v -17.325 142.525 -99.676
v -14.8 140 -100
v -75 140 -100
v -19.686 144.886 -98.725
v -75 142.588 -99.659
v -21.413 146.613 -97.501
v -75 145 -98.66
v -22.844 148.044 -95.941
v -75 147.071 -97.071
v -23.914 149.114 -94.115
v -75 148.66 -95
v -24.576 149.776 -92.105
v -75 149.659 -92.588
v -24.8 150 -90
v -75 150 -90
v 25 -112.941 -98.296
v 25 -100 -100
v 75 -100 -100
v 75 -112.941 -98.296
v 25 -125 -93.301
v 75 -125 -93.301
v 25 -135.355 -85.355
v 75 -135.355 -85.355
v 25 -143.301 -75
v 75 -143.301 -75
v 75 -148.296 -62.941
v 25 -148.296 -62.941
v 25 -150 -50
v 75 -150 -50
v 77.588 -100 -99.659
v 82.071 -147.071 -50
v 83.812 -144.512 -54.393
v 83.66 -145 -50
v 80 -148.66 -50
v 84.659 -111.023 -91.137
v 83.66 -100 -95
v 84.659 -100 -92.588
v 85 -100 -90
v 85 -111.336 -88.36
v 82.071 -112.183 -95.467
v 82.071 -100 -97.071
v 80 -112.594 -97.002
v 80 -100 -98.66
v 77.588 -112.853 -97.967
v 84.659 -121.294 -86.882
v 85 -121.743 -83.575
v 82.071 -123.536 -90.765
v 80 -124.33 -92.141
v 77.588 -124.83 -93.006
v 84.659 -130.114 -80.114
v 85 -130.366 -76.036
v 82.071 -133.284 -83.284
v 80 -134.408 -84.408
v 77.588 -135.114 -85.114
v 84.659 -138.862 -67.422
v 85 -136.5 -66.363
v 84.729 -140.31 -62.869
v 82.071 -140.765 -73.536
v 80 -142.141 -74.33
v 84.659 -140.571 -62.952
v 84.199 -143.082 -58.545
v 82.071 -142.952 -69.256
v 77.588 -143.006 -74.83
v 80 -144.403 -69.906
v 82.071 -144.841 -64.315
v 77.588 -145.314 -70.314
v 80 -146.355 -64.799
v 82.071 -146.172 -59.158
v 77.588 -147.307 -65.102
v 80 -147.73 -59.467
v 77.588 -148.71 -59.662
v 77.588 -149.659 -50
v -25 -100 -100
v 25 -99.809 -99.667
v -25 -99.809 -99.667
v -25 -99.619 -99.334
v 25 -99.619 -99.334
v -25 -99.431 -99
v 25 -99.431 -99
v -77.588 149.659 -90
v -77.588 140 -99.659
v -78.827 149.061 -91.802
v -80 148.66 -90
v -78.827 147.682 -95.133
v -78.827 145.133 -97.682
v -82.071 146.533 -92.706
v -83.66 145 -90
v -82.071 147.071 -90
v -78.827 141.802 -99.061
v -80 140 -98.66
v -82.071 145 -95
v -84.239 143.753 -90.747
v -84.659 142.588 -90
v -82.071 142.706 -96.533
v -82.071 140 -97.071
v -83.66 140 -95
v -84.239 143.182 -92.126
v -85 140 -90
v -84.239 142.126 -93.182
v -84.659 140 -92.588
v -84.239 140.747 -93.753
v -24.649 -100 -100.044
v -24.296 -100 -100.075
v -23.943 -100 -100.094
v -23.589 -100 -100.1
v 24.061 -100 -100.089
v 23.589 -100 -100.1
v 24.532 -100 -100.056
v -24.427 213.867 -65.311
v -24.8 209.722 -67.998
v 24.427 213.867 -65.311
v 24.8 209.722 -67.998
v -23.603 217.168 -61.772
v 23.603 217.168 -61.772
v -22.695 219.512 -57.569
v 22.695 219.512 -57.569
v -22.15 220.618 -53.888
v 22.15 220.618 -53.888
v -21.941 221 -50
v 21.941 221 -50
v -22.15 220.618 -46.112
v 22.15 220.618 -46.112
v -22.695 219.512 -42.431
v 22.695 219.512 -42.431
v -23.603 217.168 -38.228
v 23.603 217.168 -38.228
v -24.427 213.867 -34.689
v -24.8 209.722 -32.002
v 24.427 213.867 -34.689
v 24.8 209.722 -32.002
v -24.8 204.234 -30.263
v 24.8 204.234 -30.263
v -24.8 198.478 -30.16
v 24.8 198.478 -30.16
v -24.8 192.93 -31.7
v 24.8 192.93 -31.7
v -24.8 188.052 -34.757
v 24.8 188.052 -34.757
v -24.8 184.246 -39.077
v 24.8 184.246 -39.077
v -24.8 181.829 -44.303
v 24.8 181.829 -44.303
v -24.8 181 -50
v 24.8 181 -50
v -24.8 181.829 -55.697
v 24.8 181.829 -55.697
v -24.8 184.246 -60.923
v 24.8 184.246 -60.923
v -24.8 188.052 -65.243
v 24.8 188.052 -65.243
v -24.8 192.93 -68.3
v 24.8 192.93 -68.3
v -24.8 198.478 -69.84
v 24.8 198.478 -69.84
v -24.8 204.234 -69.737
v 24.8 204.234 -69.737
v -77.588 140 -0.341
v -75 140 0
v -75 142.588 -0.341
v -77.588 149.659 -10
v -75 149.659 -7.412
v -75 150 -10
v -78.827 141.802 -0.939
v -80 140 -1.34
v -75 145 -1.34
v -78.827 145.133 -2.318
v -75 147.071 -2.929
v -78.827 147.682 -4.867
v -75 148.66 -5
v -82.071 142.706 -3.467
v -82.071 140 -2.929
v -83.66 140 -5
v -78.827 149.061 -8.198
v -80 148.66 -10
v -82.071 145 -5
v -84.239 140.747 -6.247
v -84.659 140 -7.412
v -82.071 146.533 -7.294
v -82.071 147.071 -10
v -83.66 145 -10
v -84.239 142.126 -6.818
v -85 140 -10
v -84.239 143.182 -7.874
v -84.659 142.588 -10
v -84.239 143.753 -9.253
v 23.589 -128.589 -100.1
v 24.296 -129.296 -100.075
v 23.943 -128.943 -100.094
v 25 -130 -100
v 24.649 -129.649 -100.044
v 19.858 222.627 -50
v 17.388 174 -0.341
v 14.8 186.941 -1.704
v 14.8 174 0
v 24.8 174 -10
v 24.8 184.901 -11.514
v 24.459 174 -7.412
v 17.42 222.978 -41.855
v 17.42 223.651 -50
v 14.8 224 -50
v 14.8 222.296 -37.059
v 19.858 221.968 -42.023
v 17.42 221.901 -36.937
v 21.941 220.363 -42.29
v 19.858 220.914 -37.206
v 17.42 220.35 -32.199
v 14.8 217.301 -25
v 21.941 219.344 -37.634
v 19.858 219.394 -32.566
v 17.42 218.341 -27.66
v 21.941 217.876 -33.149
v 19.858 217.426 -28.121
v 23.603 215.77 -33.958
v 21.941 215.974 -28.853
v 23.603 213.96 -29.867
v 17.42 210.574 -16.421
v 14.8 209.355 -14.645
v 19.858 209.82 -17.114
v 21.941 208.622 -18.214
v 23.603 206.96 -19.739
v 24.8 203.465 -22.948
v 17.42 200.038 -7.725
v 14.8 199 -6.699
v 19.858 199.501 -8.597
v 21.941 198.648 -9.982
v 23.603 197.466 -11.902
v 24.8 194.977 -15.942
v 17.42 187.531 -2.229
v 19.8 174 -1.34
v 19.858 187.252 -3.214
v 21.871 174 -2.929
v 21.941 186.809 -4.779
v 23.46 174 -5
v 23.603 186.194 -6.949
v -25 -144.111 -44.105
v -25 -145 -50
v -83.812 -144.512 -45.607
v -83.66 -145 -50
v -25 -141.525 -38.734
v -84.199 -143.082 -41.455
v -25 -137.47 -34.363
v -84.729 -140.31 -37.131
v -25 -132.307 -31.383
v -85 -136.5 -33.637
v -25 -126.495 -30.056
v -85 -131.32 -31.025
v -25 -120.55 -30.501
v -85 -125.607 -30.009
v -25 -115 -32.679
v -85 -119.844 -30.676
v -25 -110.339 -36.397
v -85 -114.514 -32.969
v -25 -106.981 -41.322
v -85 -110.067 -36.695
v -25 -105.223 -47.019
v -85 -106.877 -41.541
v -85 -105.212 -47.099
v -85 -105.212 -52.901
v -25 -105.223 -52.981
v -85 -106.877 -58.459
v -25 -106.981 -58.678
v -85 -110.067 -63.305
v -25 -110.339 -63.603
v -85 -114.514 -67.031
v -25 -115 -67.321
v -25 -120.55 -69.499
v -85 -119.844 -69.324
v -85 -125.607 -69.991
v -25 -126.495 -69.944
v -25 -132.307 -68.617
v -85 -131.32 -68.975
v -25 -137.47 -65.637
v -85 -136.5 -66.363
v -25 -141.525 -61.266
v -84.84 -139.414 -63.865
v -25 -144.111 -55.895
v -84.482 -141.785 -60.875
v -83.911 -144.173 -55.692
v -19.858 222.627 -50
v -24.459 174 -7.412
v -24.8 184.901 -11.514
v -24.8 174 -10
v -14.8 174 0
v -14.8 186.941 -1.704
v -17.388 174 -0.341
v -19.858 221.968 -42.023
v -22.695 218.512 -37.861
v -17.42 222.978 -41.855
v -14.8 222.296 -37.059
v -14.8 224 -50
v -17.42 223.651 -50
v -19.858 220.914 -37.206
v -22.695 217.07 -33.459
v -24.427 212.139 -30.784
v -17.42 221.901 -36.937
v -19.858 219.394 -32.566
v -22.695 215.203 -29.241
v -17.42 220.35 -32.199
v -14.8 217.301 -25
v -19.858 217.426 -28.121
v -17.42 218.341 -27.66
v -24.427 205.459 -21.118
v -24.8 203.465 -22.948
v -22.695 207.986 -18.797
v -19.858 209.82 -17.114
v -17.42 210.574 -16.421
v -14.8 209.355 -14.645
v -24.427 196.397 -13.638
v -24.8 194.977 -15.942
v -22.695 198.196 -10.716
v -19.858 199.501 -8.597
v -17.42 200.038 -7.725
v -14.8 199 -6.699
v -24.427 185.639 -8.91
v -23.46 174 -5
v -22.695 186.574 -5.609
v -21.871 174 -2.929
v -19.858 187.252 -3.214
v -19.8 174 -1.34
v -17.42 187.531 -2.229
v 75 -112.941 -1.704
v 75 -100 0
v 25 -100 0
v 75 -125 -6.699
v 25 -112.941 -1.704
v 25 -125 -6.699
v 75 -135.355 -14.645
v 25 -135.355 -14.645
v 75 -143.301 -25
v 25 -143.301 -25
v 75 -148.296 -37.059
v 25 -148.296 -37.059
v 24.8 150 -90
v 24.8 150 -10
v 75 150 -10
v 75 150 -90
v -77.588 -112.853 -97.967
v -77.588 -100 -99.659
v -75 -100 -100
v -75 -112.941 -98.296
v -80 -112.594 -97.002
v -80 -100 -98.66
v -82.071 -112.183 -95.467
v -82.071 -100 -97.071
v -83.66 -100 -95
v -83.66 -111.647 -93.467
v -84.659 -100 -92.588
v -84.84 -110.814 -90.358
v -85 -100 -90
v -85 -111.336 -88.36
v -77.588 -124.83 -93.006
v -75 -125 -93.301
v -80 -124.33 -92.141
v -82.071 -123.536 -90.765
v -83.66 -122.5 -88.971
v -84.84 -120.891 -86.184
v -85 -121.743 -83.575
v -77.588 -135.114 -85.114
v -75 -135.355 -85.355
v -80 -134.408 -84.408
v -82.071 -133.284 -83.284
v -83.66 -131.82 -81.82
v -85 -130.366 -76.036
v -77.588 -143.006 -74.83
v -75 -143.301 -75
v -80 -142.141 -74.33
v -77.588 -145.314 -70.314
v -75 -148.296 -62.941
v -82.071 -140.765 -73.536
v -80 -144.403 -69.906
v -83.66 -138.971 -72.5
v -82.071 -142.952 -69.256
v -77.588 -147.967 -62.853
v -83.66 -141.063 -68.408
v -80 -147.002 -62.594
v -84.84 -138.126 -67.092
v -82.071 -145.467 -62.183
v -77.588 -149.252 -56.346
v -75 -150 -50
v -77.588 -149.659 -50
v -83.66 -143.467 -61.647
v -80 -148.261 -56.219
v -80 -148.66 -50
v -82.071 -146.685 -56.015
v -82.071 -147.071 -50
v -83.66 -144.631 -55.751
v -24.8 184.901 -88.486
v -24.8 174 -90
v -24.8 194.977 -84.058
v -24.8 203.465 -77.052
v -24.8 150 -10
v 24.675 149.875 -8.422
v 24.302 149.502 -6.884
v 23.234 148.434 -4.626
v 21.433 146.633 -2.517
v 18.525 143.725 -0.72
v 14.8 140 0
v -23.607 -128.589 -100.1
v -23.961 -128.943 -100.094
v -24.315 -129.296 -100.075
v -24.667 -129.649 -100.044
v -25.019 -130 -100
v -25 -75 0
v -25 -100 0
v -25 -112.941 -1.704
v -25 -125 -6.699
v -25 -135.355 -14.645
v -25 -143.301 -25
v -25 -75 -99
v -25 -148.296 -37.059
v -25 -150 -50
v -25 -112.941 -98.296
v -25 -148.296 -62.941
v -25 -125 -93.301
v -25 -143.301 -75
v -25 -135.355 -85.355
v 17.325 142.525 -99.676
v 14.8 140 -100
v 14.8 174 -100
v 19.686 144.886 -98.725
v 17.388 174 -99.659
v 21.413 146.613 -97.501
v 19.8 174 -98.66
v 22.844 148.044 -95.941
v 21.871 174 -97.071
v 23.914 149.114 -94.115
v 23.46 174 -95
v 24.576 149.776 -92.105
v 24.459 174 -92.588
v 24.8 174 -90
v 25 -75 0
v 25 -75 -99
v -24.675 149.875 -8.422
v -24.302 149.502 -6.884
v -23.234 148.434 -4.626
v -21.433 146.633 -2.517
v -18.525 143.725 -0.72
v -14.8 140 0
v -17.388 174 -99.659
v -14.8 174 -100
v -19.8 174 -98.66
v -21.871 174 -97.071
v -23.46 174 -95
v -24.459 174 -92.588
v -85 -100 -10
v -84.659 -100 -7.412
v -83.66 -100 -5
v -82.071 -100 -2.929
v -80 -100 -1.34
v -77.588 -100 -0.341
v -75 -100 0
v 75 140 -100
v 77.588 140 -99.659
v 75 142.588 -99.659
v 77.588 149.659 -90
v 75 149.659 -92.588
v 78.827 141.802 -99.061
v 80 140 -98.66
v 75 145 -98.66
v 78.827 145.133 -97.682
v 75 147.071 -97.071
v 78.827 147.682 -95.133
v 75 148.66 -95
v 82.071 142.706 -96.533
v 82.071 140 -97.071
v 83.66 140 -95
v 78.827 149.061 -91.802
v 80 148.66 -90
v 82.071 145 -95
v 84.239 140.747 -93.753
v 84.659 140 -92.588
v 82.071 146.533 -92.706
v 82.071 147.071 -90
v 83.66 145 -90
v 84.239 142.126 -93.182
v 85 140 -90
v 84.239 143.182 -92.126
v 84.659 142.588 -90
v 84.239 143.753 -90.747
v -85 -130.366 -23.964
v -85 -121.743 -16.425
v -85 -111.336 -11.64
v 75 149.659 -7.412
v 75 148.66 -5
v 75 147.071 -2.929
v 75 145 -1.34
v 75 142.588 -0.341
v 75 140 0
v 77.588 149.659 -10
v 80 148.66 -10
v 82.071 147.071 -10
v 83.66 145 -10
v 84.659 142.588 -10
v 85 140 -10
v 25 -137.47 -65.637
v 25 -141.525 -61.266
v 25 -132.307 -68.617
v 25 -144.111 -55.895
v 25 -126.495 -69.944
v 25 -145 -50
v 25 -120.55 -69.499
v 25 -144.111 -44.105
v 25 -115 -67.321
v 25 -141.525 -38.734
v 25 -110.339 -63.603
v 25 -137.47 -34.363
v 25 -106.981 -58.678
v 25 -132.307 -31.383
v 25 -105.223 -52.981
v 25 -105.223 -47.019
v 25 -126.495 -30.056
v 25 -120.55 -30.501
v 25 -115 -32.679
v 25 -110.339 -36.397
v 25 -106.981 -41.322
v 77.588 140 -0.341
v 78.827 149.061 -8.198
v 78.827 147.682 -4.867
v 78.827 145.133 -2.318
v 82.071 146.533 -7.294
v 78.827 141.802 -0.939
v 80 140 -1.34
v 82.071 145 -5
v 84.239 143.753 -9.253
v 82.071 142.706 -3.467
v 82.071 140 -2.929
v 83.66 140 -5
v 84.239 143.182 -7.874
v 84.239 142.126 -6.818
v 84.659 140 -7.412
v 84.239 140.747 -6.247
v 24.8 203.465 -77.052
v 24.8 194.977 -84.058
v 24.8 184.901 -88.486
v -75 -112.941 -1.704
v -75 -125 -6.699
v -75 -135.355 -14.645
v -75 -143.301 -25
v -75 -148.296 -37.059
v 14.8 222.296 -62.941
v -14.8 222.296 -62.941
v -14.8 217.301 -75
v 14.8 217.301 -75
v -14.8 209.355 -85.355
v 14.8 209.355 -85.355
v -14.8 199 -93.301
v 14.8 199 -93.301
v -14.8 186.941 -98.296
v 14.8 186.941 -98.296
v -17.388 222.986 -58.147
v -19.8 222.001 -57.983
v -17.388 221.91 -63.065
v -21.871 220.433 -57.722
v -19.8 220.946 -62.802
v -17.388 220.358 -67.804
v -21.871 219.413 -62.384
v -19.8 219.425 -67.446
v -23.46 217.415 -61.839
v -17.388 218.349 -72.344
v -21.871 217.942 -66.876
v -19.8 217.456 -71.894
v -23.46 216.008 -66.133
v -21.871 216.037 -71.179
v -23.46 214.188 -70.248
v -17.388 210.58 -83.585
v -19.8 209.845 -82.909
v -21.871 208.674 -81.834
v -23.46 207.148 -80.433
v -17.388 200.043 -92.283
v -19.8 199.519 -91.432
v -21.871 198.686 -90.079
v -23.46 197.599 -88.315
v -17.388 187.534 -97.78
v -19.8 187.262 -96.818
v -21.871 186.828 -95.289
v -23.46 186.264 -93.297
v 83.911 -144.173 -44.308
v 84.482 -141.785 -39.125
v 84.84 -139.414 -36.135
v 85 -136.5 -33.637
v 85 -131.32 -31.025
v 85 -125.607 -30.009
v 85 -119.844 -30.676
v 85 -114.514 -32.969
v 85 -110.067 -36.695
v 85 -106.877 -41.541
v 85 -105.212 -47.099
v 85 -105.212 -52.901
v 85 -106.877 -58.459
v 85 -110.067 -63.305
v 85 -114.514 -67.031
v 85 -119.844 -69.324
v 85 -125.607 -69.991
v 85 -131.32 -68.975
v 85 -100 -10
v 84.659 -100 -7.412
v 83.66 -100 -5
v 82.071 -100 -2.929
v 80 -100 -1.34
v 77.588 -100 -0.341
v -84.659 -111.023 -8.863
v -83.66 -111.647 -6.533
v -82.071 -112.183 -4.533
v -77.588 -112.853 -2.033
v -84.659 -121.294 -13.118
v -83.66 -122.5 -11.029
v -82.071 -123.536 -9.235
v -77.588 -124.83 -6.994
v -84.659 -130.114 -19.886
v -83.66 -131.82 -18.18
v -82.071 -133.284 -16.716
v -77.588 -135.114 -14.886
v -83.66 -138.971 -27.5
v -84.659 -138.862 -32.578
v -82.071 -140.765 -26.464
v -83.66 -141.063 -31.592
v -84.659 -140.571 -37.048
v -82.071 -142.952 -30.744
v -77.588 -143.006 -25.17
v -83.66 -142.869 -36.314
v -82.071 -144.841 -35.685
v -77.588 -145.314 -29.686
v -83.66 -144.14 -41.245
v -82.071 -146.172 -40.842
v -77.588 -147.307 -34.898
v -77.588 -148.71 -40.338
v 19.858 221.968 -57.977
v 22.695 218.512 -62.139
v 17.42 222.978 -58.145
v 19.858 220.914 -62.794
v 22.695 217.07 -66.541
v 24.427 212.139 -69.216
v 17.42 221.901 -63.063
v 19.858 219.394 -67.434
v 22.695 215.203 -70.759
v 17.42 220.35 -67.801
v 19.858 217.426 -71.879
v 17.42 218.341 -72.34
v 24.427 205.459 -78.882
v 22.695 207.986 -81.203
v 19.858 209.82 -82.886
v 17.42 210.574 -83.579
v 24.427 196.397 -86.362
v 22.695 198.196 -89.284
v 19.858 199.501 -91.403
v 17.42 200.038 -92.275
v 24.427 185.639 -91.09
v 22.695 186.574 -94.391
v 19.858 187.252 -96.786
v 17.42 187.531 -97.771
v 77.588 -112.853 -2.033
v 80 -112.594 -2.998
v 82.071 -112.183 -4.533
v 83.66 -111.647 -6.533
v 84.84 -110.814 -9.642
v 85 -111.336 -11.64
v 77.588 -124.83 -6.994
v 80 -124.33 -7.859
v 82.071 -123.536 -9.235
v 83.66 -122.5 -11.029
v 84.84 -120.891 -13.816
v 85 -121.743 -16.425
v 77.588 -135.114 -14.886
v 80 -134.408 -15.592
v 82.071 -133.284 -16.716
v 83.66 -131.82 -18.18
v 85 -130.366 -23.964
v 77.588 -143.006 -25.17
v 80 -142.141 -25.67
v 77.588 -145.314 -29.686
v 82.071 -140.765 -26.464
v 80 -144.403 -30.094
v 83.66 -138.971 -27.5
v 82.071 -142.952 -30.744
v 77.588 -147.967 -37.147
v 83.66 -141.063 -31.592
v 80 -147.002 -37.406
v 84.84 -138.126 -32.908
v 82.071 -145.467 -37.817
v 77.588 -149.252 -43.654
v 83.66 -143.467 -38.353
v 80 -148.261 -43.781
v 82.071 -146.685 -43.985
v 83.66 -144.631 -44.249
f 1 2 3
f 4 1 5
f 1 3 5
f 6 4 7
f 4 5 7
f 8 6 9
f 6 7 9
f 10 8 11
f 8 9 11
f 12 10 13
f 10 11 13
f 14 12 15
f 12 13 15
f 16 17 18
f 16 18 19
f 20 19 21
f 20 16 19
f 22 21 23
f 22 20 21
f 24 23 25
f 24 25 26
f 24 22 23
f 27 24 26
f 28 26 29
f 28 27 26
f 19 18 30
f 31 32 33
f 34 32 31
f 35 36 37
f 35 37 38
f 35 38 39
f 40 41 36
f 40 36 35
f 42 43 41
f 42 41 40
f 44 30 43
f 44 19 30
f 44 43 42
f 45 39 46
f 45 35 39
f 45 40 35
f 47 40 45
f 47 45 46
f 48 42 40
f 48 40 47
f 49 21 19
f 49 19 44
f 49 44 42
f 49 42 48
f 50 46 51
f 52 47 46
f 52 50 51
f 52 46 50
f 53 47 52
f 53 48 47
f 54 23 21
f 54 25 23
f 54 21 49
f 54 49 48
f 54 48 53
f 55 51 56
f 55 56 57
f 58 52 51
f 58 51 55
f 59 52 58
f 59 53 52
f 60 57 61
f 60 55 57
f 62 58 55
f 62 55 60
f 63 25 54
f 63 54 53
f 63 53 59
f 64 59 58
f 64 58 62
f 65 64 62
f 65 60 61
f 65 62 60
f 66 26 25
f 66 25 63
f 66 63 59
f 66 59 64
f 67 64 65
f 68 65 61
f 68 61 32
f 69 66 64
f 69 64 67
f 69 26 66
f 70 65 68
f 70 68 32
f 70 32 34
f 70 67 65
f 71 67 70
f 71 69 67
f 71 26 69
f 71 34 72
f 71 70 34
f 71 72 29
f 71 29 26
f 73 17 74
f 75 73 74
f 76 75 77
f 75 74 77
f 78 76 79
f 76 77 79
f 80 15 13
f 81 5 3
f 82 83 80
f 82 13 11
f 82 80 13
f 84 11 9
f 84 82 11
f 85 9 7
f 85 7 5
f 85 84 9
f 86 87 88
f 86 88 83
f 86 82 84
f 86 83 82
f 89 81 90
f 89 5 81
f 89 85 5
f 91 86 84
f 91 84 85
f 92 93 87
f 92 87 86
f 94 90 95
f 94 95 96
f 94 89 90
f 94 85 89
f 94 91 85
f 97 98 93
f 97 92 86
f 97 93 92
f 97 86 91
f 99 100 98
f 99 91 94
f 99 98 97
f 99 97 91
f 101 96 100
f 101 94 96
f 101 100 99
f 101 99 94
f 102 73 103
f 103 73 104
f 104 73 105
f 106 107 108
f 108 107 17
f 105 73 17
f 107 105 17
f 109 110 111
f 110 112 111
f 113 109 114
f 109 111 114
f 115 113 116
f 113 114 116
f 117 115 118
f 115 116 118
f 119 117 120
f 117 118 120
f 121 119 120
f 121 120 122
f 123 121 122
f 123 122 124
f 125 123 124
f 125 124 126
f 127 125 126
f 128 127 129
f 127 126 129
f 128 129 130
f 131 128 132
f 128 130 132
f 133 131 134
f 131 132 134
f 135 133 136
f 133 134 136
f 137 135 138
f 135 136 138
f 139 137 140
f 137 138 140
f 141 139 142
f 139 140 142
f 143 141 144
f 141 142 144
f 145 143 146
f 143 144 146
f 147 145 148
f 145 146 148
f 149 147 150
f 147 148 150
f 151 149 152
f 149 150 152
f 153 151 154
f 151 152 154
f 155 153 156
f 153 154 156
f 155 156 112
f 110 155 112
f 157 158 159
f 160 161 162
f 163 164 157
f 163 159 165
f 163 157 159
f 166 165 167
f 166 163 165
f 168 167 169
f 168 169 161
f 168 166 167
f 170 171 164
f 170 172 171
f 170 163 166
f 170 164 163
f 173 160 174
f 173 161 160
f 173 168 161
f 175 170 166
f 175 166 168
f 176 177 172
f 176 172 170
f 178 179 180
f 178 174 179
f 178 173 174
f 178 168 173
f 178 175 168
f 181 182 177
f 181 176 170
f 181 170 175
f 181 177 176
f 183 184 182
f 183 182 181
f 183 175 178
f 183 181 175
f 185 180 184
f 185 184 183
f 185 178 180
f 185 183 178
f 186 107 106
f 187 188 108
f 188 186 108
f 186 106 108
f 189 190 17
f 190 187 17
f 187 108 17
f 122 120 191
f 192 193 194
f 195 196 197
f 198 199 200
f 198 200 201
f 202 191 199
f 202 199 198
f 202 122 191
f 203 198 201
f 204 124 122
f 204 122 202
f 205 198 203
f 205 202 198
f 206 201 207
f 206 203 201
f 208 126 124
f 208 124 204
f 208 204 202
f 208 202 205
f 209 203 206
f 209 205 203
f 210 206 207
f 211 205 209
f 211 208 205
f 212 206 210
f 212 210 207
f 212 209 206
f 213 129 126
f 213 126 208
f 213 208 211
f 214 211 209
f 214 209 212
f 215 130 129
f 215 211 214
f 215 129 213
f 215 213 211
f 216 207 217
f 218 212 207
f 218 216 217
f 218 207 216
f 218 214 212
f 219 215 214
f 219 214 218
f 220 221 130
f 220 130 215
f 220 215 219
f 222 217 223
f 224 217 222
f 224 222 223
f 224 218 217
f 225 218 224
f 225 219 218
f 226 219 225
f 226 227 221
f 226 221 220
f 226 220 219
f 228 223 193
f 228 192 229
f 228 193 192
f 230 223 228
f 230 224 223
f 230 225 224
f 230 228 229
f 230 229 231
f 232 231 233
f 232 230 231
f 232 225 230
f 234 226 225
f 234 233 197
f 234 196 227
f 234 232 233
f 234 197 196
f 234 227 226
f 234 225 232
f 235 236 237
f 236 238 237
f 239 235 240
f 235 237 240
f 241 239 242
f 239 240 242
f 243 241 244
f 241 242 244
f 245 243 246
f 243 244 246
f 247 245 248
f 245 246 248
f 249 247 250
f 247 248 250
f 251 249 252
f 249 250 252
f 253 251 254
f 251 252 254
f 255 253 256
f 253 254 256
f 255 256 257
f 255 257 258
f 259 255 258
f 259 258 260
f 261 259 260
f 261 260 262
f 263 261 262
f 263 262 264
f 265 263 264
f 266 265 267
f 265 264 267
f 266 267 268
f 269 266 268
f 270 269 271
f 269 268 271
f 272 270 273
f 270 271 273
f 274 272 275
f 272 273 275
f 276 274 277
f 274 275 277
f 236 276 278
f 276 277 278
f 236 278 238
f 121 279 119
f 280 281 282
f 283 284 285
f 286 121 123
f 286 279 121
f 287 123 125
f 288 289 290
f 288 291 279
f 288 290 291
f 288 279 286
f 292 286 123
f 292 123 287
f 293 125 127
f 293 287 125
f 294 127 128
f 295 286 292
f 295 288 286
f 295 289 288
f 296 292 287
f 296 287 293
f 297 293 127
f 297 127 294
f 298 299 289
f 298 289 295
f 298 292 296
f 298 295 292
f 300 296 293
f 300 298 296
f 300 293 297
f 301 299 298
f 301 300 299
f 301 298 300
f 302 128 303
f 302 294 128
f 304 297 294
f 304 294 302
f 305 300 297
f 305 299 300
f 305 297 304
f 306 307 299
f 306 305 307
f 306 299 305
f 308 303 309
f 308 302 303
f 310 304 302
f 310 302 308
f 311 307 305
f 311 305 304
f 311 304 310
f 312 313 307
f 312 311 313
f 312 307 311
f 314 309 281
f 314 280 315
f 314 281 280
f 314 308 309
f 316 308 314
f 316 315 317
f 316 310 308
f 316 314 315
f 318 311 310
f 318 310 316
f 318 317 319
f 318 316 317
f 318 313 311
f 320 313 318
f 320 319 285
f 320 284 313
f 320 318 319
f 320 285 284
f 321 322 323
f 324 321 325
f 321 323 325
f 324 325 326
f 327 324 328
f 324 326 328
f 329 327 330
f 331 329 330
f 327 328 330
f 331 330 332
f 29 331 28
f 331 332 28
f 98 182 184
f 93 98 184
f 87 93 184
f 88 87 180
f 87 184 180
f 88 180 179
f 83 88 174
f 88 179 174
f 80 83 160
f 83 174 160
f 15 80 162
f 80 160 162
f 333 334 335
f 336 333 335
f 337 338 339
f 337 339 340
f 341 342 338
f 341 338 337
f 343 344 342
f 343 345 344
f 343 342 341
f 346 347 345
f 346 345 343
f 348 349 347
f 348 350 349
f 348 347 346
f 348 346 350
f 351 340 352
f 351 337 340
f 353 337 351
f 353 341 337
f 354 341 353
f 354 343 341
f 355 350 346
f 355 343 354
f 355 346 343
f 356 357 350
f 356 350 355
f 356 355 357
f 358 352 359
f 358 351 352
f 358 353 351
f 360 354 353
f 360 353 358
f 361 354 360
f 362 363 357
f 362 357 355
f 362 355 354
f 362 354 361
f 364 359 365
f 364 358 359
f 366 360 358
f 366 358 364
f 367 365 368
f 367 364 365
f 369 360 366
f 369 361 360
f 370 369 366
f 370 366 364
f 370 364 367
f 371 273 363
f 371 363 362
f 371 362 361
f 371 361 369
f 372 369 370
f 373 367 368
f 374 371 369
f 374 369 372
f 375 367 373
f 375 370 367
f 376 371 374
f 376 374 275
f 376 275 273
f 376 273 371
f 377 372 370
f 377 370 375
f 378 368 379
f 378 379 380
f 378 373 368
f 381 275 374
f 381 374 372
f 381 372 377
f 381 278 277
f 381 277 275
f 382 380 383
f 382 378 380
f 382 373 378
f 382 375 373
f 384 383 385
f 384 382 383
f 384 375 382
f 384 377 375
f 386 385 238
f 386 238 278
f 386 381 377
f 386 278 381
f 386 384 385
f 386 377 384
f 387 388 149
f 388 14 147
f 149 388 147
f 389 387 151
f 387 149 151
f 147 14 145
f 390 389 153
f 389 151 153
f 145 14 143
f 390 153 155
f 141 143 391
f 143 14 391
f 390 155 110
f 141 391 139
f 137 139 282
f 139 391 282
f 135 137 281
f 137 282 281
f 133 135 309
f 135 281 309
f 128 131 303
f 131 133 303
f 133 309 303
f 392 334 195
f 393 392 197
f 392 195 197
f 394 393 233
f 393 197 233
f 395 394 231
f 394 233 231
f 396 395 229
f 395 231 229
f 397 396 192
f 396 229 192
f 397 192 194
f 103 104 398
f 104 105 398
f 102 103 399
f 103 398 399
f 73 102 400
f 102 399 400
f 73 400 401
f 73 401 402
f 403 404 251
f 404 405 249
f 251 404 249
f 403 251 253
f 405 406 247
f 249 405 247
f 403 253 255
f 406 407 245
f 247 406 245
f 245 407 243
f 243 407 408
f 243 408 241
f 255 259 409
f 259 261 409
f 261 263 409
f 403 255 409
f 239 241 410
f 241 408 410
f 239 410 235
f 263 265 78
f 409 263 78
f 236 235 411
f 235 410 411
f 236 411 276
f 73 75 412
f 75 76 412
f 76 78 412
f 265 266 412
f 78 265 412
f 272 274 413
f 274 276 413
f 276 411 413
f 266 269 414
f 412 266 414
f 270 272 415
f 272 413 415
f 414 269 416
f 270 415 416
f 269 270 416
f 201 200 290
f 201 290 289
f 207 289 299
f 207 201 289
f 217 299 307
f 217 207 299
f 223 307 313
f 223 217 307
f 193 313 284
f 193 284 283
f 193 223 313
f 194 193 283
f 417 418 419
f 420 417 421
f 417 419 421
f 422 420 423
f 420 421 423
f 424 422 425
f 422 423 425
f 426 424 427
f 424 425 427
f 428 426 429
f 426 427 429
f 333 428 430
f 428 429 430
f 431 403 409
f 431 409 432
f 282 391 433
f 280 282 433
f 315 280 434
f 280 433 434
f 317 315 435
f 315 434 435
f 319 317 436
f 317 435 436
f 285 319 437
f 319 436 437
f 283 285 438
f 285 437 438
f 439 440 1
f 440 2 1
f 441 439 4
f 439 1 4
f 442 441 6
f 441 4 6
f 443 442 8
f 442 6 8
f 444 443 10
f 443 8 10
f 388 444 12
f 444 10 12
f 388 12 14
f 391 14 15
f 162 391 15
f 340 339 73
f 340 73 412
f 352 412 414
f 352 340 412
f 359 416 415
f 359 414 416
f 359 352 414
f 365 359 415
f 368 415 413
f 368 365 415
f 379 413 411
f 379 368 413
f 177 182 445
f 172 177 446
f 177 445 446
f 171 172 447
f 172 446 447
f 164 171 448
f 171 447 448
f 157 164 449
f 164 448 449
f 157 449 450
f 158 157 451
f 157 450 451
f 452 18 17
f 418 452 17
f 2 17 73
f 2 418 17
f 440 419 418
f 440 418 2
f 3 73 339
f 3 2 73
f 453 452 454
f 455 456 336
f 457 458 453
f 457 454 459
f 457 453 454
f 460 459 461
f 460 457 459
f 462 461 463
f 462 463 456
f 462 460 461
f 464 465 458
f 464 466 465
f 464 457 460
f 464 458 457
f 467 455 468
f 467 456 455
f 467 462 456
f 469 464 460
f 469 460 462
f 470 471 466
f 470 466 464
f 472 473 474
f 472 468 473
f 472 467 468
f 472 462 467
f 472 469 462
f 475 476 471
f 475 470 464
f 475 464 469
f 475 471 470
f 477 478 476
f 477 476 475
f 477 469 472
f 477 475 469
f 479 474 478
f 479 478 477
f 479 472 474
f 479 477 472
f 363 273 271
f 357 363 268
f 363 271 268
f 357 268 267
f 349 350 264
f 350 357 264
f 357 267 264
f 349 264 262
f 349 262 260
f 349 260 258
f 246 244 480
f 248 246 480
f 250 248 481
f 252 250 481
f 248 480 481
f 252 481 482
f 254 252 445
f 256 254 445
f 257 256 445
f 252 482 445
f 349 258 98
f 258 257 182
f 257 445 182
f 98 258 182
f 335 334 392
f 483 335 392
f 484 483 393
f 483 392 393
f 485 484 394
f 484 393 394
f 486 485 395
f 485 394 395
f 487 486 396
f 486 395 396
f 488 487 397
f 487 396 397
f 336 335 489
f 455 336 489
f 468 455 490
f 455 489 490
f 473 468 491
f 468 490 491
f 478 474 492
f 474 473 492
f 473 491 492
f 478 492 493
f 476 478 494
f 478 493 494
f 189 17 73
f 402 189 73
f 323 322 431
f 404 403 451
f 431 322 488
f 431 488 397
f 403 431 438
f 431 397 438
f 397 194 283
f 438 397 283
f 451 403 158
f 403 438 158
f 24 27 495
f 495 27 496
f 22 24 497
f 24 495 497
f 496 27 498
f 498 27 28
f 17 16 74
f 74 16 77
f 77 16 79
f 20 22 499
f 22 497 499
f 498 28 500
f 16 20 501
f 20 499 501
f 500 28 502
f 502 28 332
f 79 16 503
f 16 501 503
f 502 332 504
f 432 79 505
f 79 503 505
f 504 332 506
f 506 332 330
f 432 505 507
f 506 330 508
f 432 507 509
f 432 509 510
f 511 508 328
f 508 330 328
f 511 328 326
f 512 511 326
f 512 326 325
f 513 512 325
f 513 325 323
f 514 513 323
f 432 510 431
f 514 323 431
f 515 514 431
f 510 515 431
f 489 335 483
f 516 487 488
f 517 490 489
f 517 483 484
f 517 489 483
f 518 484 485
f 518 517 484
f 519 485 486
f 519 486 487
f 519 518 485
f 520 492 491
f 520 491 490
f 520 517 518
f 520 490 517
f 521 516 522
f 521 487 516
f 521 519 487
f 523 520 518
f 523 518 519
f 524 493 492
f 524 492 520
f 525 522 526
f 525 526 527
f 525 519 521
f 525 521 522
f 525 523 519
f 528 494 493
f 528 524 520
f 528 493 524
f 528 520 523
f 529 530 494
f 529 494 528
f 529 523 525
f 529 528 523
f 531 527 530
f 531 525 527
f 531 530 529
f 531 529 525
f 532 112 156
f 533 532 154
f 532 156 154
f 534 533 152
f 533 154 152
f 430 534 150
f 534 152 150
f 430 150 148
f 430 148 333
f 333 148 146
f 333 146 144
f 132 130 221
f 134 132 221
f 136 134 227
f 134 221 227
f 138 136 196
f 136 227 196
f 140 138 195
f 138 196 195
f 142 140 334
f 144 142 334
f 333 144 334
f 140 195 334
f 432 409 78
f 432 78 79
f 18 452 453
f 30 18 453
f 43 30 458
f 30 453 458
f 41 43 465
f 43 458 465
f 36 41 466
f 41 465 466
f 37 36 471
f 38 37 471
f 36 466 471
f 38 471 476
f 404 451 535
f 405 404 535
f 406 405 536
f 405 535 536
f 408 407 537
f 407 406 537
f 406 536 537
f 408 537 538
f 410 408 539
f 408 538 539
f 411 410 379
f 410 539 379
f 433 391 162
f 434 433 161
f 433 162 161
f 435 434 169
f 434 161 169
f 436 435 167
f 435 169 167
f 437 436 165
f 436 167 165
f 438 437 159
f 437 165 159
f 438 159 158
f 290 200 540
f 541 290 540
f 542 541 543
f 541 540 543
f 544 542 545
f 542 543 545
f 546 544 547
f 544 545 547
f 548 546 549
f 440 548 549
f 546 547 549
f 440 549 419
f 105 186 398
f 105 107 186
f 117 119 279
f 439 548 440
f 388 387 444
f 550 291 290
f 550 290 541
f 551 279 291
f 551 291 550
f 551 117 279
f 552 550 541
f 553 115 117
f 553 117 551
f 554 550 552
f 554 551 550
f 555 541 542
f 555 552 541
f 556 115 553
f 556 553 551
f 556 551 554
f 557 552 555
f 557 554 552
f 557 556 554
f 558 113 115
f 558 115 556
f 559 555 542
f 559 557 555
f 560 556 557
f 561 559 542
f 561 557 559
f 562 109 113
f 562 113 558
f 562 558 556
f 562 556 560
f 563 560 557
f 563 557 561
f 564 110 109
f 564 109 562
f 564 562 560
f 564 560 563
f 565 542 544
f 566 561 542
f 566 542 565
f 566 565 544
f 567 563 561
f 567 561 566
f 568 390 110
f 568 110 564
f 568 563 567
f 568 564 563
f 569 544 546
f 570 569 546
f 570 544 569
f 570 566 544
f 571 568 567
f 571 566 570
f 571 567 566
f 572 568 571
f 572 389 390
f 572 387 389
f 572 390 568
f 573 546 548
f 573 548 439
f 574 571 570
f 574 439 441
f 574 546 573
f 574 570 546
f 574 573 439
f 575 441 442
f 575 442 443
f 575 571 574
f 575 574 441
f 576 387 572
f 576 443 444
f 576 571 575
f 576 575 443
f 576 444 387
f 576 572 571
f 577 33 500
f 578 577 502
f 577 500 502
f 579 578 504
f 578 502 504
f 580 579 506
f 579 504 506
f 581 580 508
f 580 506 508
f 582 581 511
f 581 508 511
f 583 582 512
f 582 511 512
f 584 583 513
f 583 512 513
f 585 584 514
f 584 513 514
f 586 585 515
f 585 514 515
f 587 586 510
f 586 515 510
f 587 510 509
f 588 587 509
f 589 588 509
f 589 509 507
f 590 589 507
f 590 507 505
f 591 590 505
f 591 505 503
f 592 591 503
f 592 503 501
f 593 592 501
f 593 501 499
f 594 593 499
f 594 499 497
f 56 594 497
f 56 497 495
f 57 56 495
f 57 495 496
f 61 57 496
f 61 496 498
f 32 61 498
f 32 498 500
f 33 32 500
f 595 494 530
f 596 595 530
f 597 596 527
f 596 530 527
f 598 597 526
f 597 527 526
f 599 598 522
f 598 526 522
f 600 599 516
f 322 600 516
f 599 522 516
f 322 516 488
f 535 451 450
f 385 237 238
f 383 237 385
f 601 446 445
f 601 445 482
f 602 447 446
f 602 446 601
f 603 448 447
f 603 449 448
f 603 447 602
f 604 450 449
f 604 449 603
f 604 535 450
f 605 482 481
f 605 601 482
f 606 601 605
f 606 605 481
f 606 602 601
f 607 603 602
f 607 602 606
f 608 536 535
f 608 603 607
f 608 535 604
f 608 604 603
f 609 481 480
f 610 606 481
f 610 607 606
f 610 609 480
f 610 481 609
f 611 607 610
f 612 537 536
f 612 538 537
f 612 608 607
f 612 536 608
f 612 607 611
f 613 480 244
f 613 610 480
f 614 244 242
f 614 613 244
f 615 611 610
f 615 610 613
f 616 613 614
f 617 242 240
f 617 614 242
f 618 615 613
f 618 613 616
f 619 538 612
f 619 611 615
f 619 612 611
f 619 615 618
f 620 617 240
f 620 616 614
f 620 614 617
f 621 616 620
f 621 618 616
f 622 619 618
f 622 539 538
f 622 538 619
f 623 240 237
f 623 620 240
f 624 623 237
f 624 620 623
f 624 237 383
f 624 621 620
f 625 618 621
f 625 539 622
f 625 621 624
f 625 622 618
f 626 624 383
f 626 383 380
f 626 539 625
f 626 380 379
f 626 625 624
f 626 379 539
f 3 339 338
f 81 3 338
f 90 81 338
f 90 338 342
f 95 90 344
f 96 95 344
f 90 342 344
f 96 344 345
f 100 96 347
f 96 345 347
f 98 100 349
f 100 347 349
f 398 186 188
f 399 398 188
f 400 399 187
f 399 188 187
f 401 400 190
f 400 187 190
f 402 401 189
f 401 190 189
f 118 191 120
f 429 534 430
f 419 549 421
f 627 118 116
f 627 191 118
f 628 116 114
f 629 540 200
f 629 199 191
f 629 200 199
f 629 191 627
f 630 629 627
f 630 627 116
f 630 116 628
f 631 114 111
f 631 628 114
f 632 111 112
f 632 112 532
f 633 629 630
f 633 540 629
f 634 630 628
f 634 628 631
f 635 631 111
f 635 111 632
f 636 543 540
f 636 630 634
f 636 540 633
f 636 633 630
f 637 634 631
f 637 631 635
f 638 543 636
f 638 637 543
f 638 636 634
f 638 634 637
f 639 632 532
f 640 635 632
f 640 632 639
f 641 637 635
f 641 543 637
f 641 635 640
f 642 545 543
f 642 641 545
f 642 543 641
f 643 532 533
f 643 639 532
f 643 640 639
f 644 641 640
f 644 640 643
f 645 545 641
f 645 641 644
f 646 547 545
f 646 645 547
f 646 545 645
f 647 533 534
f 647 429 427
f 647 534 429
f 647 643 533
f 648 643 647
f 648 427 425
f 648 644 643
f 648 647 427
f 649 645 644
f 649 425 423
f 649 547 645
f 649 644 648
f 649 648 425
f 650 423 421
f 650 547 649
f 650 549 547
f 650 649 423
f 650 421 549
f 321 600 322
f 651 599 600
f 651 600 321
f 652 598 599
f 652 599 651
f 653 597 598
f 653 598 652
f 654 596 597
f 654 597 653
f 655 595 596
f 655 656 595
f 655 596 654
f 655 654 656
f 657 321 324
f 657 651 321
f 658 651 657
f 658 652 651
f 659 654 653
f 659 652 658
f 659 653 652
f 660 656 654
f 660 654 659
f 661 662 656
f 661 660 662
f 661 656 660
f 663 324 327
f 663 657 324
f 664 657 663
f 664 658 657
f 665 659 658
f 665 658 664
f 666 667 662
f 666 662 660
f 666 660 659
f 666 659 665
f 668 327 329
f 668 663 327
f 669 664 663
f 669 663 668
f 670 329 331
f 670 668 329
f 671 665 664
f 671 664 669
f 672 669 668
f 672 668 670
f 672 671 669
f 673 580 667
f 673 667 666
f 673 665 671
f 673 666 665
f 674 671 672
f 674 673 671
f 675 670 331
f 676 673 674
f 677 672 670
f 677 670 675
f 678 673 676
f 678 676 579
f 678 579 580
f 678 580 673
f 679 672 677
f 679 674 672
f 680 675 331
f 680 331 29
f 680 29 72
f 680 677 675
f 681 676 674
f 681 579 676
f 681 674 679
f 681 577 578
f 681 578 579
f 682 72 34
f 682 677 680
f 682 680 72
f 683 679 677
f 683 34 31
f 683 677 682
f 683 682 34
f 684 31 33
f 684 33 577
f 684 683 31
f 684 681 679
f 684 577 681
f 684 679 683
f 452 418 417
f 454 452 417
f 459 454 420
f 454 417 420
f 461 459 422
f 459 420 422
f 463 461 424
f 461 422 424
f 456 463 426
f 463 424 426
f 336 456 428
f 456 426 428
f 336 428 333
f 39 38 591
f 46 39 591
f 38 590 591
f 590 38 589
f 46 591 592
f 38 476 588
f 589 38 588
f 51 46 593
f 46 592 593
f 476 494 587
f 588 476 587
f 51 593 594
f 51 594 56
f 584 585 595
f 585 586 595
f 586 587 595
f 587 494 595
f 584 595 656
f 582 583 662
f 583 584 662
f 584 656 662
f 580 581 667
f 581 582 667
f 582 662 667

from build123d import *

# Parameters (mm, degrees)
BOSS_EXTRUDE1_DEPTH    = 100
SKETCH2_W              = 50
SKETCH2_H              = 50
CUT_EXTRUDE1_DEPTH     = 260.617025636
FILLET1_R              = 50
CUT_EXTRUDE2_DEPTH     = 25
SKETCH7_R              = 20
CUT_EXTRUDE3_DEPTH     = 299.456026912
FILLET2_R              = 50
CUT_EXTRUDE6_START     = -150
CUT_EXTRUDE6_OUTLINE_W = 50
CUT_EXTRUDE6_OUTLINE_H = 6.698729811
CUT_EXTRUDE6_DEPTH     = 50
CUT_EXTRUDE7_DEPTH     = 25
FILLET3_R              = 10
SKETCH11_W             = 50
SKETCH11_H             = 25
CUT_EXTRUDE8_DEPTH     = 99
BOSS_EXTRUDE7_DEPTH    = 0.1
FILLET4_R              = 10
FILLET5_R              = 10
SKETCH14_R             = 20
CUT_EXTRUDE9_DEPTH     = 269.797414546


with BuildPart() as part:
    # Sketch1 → Boss-Extrude1 (new body)
    with BuildSketch(Plane.XY):
        Polygon((-24.8, 150), (-24.8, 224), (24.8, 224), (24.8, 150), (85, 150), (85, -150), (-85, -150), (-85, 150), align=None)
    extrude(amount=-BOSS_EXTRUDE1_DEPTH)

    # Sketch2 → Cut-Extrude1 (cut, through all)
    with BuildSketch(Plane.XY):
        with Locations((0, -150)):
            Rectangle(SKETCH2_W, SKETCH2_H)
    extrude(amount=-CUT_EXTRUDE1_DEPTH, mode=Mode.SUBTRACT)

    # Fillet1
    fillet1_edges = [part.edges().sort_by_distance(p)[0] for p in [
        (0, 224, -100),
        (0, 224, 0),
    ]]
    fillet(fillet1_edges, radius=FILLET1_R - 0.0001)  # a hair under: the kernel refuses the full size

    # Sketch6 → Cut-Extrude2 (cut, symmetric)
    with BuildSketch(Plane(origin=(0, 0, 0), x_dir=(0, 0, -1), z_dir=(1, 0, 0))):
        with BuildLine():
            Line((100, -125), (0, -125))
            ThreePointArc((0, -125), (50, -75), (100, -125))
        make_face()
    extrude(amount=CUT_EXTRUDE2_DEPTH, both=True, mode=Mode.SUBTRACT)

    # Sketch7 → Cut-Extrude3 (cut, through all)
    with BuildSketch(Plane.ZY.offset(85)):
        with Locations(Location((-50, -125, 0), (0, 0, 270))):
            Circle(SKETCH7_R)
    extrude(amount=-CUT_EXTRUDE3_DEPTH, mode=Mode.SUBTRACT)

    # Fillet2
    fillet2_edges = [part.edges().sort_by_distance(p)[0] for p in [
        (-55, -150, -100),
        (-55, -150, 0),
    ]]
    fillet(fillet2_edges, radius=FILLET2_R - 0.0001)  # a hair under: the kernel refuses the full size

    # Cut-Extrude6: read off the stored shape, not the designer's step
    # Cut-Extrude6 outline → Cut-Extrude6 (cut)
    with BuildSketch(Plane(origin=(0, 0, 0), x_dir=(1, 0, 0), z_dir=(0, 1, 0)).offset(CUT_EXTRUDE6_START)):
        with Locations((0, 96.650635095)):
            Rectangle(CUT_EXTRUDE6_OUTLINE_W, CUT_EXTRUDE6_OUTLINE_H)
        with Locations((0, 3.349364906)):
            Rectangle(CUT_EXTRUDE6_OUTLINE_W, CUT_EXTRUDE6_OUTLINE_H)
    extrude(amount=CUT_EXTRUDE6_DEPTH, mode=Mode.SUBTRACT)

    # Sketch10 → Cut-Extrude7 (cut, symmetric)
    with BuildSketch(Plane(origin=(0, 0, 0), x_dir=(0, 0, -1), z_dir=(1, 0, 0))):
        with BuildLine():
            Line((0, -100), (100, -100))
            ThreePointArc((100, -100), (50, -86.611517322), (0, -100))
        make_face()
    extrude(amount=CUT_EXTRUDE7_DEPTH, both=True, mode=Mode.SUBTRACT)

    # Fillet3
    # the kernel refuses this fillet: 10 mm, written as the material it takes off along each edge
    with BuildSketch(Plane(origin=(24.8, 174.0001, -100), x_dir=(0, 0, 1), z_dir=(0, -1, 0)), Plane(origin=(-24.8, 150, 0), x_dir=(1, 0, 0), z_dir=(0, 1, 0)), Plane(origin=(-24.8, 150, -100), x_dir=(0, 0, 1), z_dir=(0, 1, 0)), Plane(origin=(24.8, 174.0001, 0), x_dir=(-1, 0, 0), z_dir=(0, -1, 0))) as fillet3_piece_1:
        with BuildLine():
            CenterArc((FILLET3_R, FILLET3_R), FILLET3_R, 180, 90)
            Line((0, FILLET3_R), (0, 0))
            Line((0, 0), (FILLET3_R, 0))
        make_face()
    extrude(amount=24.0001, mode=Mode.SUBTRACT)
    with BuildSketch(Plane(origin=(24.8, 150, 0), x_dir=(0, -1, 0), z_dir=(1, 0, 0)), Plane(origin=(-110, 150, -100), x_dir=(0, 0, 1), z_dir=(1, 0, 0)), Plane(origin=(24.8, 150, -100), x_dir=(0, 0, 1), z_dir=(1, 0, 0)), Plane(origin=(-110, 150, 0), x_dir=(0, -1, 0), z_dir=(1, 0, 0))) as fillet3_piece_2:
        with BuildLine():
            CenterArc((FILLET3_R, FILLET3_R), FILLET3_R, 180, 90)
            Line((0, FILLET3_R), (0, 0))
            Line((0, 0), (FILLET3_R, 0))
        make_face()
    extrude(amount=85.2, mode=Mode.SUBTRACT)
    with BuildSketch(Plane(origin=(-85, -100.0001, -100), x_dir=(0, 0, 1), z_dir=(0, 1, 0)), Plane(origin=(85, 175, 0), x_dir=(-1, 0, 0), z_dir=(0, -1, 0)), Plane(origin=(85, 175, -100), x_dir=(0, 0, 1), z_dir=(0, -1, 0)), Plane(origin=(-85, -100.0001, 0), x_dir=(1, 0, 0), z_dir=(0, 1, 0))) as fillet3_piece_3:
        with BuildLine():
            CenterArc((FILLET3_R, FILLET3_R), FILLET3_R, 180, 90)
            Line((0, FILLET3_R), (0, 0))
            Line((0, 0), (FILLET3_R, 0))
        make_face()
    extrude(amount=275.0001, mode=Mode.SUBTRACT)
    with BuildSketch(Plane(origin=(-24.8, 174.0001, -49.9999), x_dir=(0, 1, 0), z_dir=(0, 0, -1))) as fillet3_piece_4:
        with BuildLine():
            CenterArc((49.9999 - FILLET3_R, FILLET3_R), FILLET3_R, 270, 90)
            Line((49.9999 - FILLET3_R, 0), (49.9999, 0))
            Line((49.9999, 0), (49.9999, FILLET3_R))
        make_face()
    revolve(axis=Axis((-24.8, 174.0001, -49.9999), (1, 0, 0)), revolution_arc=90, mode=Mode.SUBTRACT)
    with BuildSketch(Plane(origin=(-24.8, 174.0001, -50.0001), x_dir=(0, 1, 0), z_dir=(0, 0, 1))) as fillet3_piece_5:
        with BuildLine():
            CenterArc((49.9999 - FILLET3_R, -FILLET3_R), FILLET3_R, 0, 90)
            Line((49.9999, -FILLET3_R), (49.9999, 0))
            Line((49.9999, 0), (49.9999 - FILLET3_R, 0))
        make_face()
    revolve(axis=Axis((-24.8, 174.0001, -50.0001), (-1, 0, 0)), revolution_arc=90, mode=Mode.SUBTRACT)
    with BuildSketch(Plane(origin=(24.8, 174.0001, -49.9999), x_dir=(0, 1, 0), z_dir=(0, 0, -1))) as fillet3_piece_6:
        with BuildLine():
            CenterArc((49.9999 - FILLET3_R, -FILLET3_R), FILLET3_R, 0, 90)
            Line((49.9999, -FILLET3_R), (49.9999, 0))
            Line((49.9999, 0), (49.9999 - FILLET3_R, 0))
        make_face()
    revolve(axis=Axis((24.8, 174.0001, -49.9999), (1, 0, 0)), revolution_arc=90, mode=Mode.SUBTRACT)
    with BuildSketch(Plane(origin=(24.8, 174.0001, -50.0001), x_dir=(0, 1, 0), z_dir=(0, 0, 1))) as fillet3_piece_7:
        with BuildLine():
            CenterArc((49.9999 - FILLET3_R, FILLET3_R), FILLET3_R, 270, 90)
            Line((49.9999, FILLET3_R), (49.9999, 0))
            Line((49.9999, 0), (49.9999 - FILLET3_R, 0))
        make_face()
    revolve(axis=Axis((24.8, 174.0001, -50.0001), (-1, 0, 0)), revolution_arc=90, mode=Mode.SUBTRACT)
    with BuildSketch(Plane(origin=(85, -100.0001, -49.9999), x_dir=(0, 0, 1), z_dir=(0, 1, 0))) as fillet3_piece_8:
        with BuildLine():
            CenterArc((49.9999 - FILLET3_R, -FILLET3_R), FILLET3_R, 360, 90)
            Line((49.9999, -FILLET3_R), (49.9999, 0))
            Line((49.9999, 0), (49.9999 - FILLET3_R, 0))
        make_face()
    revolve(axis=Axis((85, -100.0001, -49.9999), (1, 0, 0)), revolution_arc=90, mode=Mode.SUBTRACT)
    with BuildSketch(Plane(origin=(85, -100.0001, -50.0001), x_dir=(0, 0, -1), z_dir=(0, 1, 0))) as fillet3_piece_9:
        with BuildLine():
            CenterArc((49.9999 - FILLET3_R, FILLET3_R), FILLET3_R, 270, 90)
            Line((49.9999, FILLET3_R), (49.9999, 0))
            Line((49.9999, 0), (49.9999 - FILLET3_R, 0))
        make_face()
    revolve(axis=Axis((85, -100.0001, -50.0001), (-1, 0, 0)), revolution_arc=90, mode=Mode.SUBTRACT)
    with BuildSketch(Plane(origin=(-85, -100.0001, -49.9999), x_dir=(0, 0, 1), z_dir=(0, 1, 0))) as fillet3_piece_10:
        with BuildLine():
            CenterArc((49.9999 - FILLET3_R, FILLET3_R), FILLET3_R, 270, 90)
            Line((49.9999, FILLET3_R), (49.9999, 0))
            Line((49.9999, 0), (49.9999 - FILLET3_R, 0))
        make_face()
    revolve(axis=Axis((-85, -100.0001, -49.9999), (1, 0, 0)), revolution_arc=90, mode=Mode.SUBTRACT)
    with BuildSketch(Plane(origin=(-85, -100.0001, -50.0001), x_dir=(0, 0, -1), z_dir=(0, 1, 0))) as fillet3_piece_11:
        with BuildLine():
            CenterArc((49.9999 - FILLET3_R, -FILLET3_R), FILLET3_R, 0, 90)
            Line((49.9999, -FILLET3_R), (49.9999, 0))
            Line((49.9999, 0), (49.9999 - FILLET3_R, 0))
        make_face()
    revolve(axis=Axis((-85, -100.0001, -50.0001), (-1, 0, 0)), revolution_arc=90, mode=Mode.SUBTRACT)
    with BuildSketch(Plane(origin=(-85, -150, -49.9999), x_dir=(0, 1, 0), z_dir=(0, 0, -1)), Plane(origin=(24.8, 224, -49.9999), x_dir=(0, -1, 0), z_dir=(0, 0, -1))) as fillet3_piece_12:
        with BuildLine():
            CenterArc((FILLET3_R, FILLET3_R), FILLET3_R, 180, 90)
            Line((0, FILLET3_R), (0, 0))
            Line((0, 0), (FILLET3_R, 0))
        make_face()
    extrude(amount=0.0002, mode=Mode.SUBTRACT)
    with BuildSketch(Plane(origin=(85, -150, -49.9999), x_dir=(0, 1, 0), z_dir=(0, 0, -1)), Plane(origin=(-24.8, 224, -49.9999), x_dir=(0, -1, 0), z_dir=(0, 0, -1))) as fillet3_piece_13:
        with BuildLine():
            CenterArc((FILLET3_R, -FILLET3_R), FILLET3_R, 90, 90)
            Line((0, -FILLET3_R), (0, 0))
            Line((0, 0), (FILLET3_R, 0))
        make_face()
    extrude(amount=0.0002, mode=Mode.SUBTRACT)
    with BuildSketch(Plane(origin=(-0.2, 150, -100), x_dir=(0, 0, 1), z_dir=(1, 0, 0))) as fillet3_piece_14a_section:
        with BuildLine():
            CenterArc((FILLET3_R, FILLET3_R), FILLET3_R, 180, 90)
            Line((0, FILLET3_R), (0, 0))
            Line((0, 0), (FILLET3_R, 0))
        make_face()
    fillet3_piece_14a = extrude(amount=110.2, mode=Mode.PRIVATE)
    fillet3_piece_14a = split(fillet3_piece_14a, bisect_by=Plane(origin=(24.8, 150, -100), z_dir=(-1, 0, 0)), keep=Keep.TOP, mode=Mode.PRIVATE)
    with BuildSketch(Plane(origin=(24.8, 174.0001, -100), x_dir=(0, 0, 1), z_dir=(0, -1, 0))) as fillet3_piece_14b_section:
        with BuildLine():
            CenterArc((FILLET3_R, FILLET3_R), FILLET3_R, 180, 90)
            Line((0, FILLET3_R), (0, 0))
            Line((0, 0), (FILLET3_R, 0))
        make_face()
    fillet3_piece_14b = extrude(amount=49.0001, mode=Mode.PRIVATE)
    fillet3_piece_14b = split(fillet3_piece_14b, bisect_by=Plane(origin=(24.8, 150, -100), z_dir=(0, -1, 0)), keep=Keep.TOP, mode=Mode.PRIVATE)
    fillet3_piece_14 = fillet3_piece_14a & fillet3_piece_14b
    add(fillet3_piece_14, mode=Mode.SUBTRACT)
    with BuildSketch(Plane(origin=(-0.2, 150, 0), x_dir=(0, -1, 0), z_dir=(1, 0, 0))) as fillet3_piece_15a_section:
        with BuildLine():
            CenterArc((FILLET3_R, FILLET3_R), FILLET3_R, 180, 90)
            Line((0, FILLET3_R), (0, 0))
            Line((0, 0), (FILLET3_R, 0))
        make_face()
    fillet3_piece_15a = extrude(amount=110.2, mode=Mode.PRIVATE)
    fillet3_piece_15a = split(fillet3_piece_15a, bisect_by=Plane(origin=(24.8, 150, 0), z_dir=(-1, 0, 0)), keep=Keep.TOP, mode=Mode.PRIVATE)
    with BuildSketch(Plane(origin=(24.8, 174.0001, 0), x_dir=(-1, 0, 0), z_dir=(0, -1, 0))) as fillet3_piece_15b_section:
        with BuildLine():
            CenterArc((FILLET3_R, FILLET3_R), FILLET3_R, 180, 90)
            Line((0, FILLET3_R), (0, 0))
            Line((0, 0), (FILLET3_R, 0))
        make_face()
    fillet3_piece_15b = extrude(amount=49.0001, mode=Mode.PRIVATE)
    fillet3_piece_15b = split(fillet3_piece_15b, bisect_by=Plane(origin=(24.8, 150, 0), z_dir=(0, -1, 0)), keep=Keep.TOP, mode=Mode.PRIVATE)
    fillet3_piece_15 = fillet3_piece_15a & fillet3_piece_15b
    add(fillet3_piece_15, mode=Mode.SUBTRACT)
    with BuildSketch(Plane(origin=(-24.8, 125, -100), x_dir=(0, 0, 1), z_dir=(0, 1, 0))) as fillet3_piece_16a_section:
        with BuildLine():
            CenterArc((FILLET3_R, FILLET3_R), FILLET3_R, 180, 90)
            Line((0, FILLET3_R), (0, 0))
            Line((0, 0), (FILLET3_R, 0))
        make_face()
    fillet3_piece_16a = extrude(amount=49.0001, mode=Mode.PRIVATE)
    fillet3_piece_16a = split(fillet3_piece_16a, bisect_by=Plane(origin=(-24.8, 150, -100), z_dir=(0, -1, 0)), keep=Keep.TOP, mode=Mode.PRIVATE)
    with BuildSketch(Plane(origin=(-110, 150, -100), x_dir=(0, 0, 1), z_dir=(1, 0, 0))) as fillet3_piece_16b_section:
        with BuildLine():
            CenterArc((FILLET3_R, FILLET3_R), FILLET3_R, 180, 90)
            Line((0, FILLET3_R), (0, 0))
            Line((0, 0), (FILLET3_R, 0))
        make_face()
    fillet3_piece_16b = extrude(amount=110.2, mode=Mode.PRIVATE)
    fillet3_piece_16b = split(fillet3_piece_16b, bisect_by=Plane(origin=(-24.8, 150, -100), z_dir=(1, 0, 0)), keep=Keep.TOP, mode=Mode.PRIVATE)
    fillet3_piece_16 = fillet3_piece_16a & fillet3_piece_16b
    add(fillet3_piece_16, mode=Mode.SUBTRACT)
    with BuildSketch(Plane(origin=(-24.8, 125, 0), x_dir=(1, 0, 0), z_dir=(0, 1, 0))) as fillet3_piece_17a_section:
        with BuildLine():
            CenterArc((FILLET3_R, FILLET3_R), FILLET3_R, 180, 90)
            Line((0, FILLET3_R), (0, 0))
            Line((0, 0), (FILLET3_R, 0))
        make_face()
    fillet3_piece_17a = extrude(amount=49.0001, mode=Mode.PRIVATE)
    fillet3_piece_17a = split(fillet3_piece_17a, bisect_by=Plane(origin=(-24.8, 150, 0), z_dir=(0, -1, 0)), keep=Keep.TOP, mode=Mode.PRIVATE)
    with BuildSketch(Plane(origin=(-110, 150, 0), x_dir=(0, -1, 0), z_dir=(1, 0, 0))) as fillet3_piece_17b_section:
        with BuildLine():
            CenterArc((FILLET3_R, FILLET3_R), FILLET3_R, 180, 90)
            Line((0, FILLET3_R), (0, 0))
            Line((0, 0), (FILLET3_R, 0))
        make_face()
    fillet3_piece_17b = extrude(amount=110.2, mode=Mode.PRIVATE)
    fillet3_piece_17b = split(fillet3_piece_17b, bisect_by=Plane(origin=(-24.8, 150, 0), z_dir=(1, 0, 0)), keep=Keep.TOP, mode=Mode.PRIVATE)
    fillet3_piece_17 = fillet3_piece_17a & fillet3_piece_17b
    add(fillet3_piece_17, mode=Mode.SUBTRACT)

    # Sketch11 → Cut-Extrude8 (cut)
    with BuildSketch(Plane.XY):
        with Locations((0, -87.5)):
            Rectangle(SKETCH11_W, SKETCH11_H)
    extrude(amount=-CUT_EXTRUDE8_DEPTH, mode=Mode.SUBTRACT)

    # Fillet5
    # the kernel refuses this fillet: 10 mm, written as the material it takes off along each edge
    with BuildSketch(Plane(origin=(75, 140, -10), x_dir=(0, 1, 0), z_dir=(1, 0, 0))) as fillet5_piece_1_section:
        Polygon((0, 0), (FILLET5_R, 0), (FILLET5_R, FILLET5_R), (0, FILLET5_R), align=None)
    fillet5_piece_1 = extrude(amount=FILLET5_R, mode=Mode.PRIVATE)
    fillet5_piece_1 = fillet5_piece_1 - Plane(origin=(75, 140, -10), x_dir=(0, -0.7071067811865475, -0.7071067811865475), z_dir=(1, 0, 0)) * Sphere(FILLET5_R, mode=Mode.PRIVATE)
    add(fillet5_piece_1, mode=Mode.SUBTRACT)
    with BuildSketch(Plane(origin=(75, 140, -90), x_dir=(0, 1, 0), z_dir=(1, 0, 0))) as fillet5_piece_2_section:
        Polygon((0, 0), (FILLET5_R, 0), (FILLET5_R, -FILLET5_R), (0, -FILLET5_R), align=None)
    fillet5_piece_2 = extrude(amount=FILLET5_R, mode=Mode.PRIVATE)
    fillet5_piece_2 = fillet5_piece_2 - Plane(origin=(75, 140, -90), x_dir=(0, -0.7071067811865475, 0.7071067811865475), z_dir=(1, 0, 0)) * Sphere(FILLET5_R, mode=Mode.PRIVATE)
    add(fillet5_piece_2, mode=Mode.SUBTRACT)
    with BuildSketch(Plane(origin=(-75, 140, -90), x_dir=(0, 1, 0), z_dir=(-1, 0, 0))) as fillet5_piece_3_section:
        Polygon((0, 0), (FILLET5_R, 0), (FILLET5_R, FILLET5_R), (0, FILLET5_R), align=None)
    fillet5_piece_3 = extrude(amount=FILLET5_R, mode=Mode.PRIVATE)
    fillet5_piece_3 = fillet5_piece_3 - Plane(origin=(-75, 140, -90), x_dir=(0, -0.7071067811865475, 0.7071067811865475), z_dir=(-1, 0, 0)) * Sphere(FILLET5_R, mode=Mode.PRIVATE)
    add(fillet5_piece_3, mode=Mode.SUBTRACT)
    with BuildSketch(Plane(origin=(-75, 140, -10), x_dir=(0, 1, 0), z_dir=(-1, 0, 0))) as fillet5_piece_4_section:
        Polygon((0, 0), (FILLET5_R, 0), (FILLET5_R, -FILLET5_R), (0, -FILLET5_R), align=None)
    fillet5_piece_4 = extrude(amount=FILLET5_R, mode=Mode.PRIVATE)
    fillet5_piece_4 = fillet5_piece_4 - Plane(origin=(-75, 140, -10), x_dir=(0, -0.7071067811865475, -0.7071067811865475), z_dir=(-1, 0, 0)) * Sphere(FILLET5_R, mode=Mode.PRIVATE)
    add(fillet5_piece_4, mode=Mode.SUBTRACT)
    with BuildSketch(Plane(origin=(85, 150, -10), x_dir=(0, -1, 0), z_dir=(0, 0, -1))) as fillet5_piece_5:
        with BuildLine():
            CenterArc((FILLET5_R, FILLET5_R), FILLET5_R, 180, 90)
            Line((0, FILLET5_R), (0, 0))
            Line((0, 0), (FILLET5_R, 0))
        make_face()
    extrude(amount=80, mode=Mode.SUBTRACT)
    with BuildSketch(Plane(origin=(-85, 150, -10), x_dir=(0, -1, 0), z_dir=(0, 0, -1))) as fillet5_piece_6:
        with BuildLine():
            CenterArc((FILLET5_R, -FILLET5_R), FILLET5_R, 90, 90)
            Line((0, -FILLET5_R), (0, 0))
            Line((0, 0), (FILLET5_R, 0))
        make_face()
    extrude(amount=80, mode=Mode.SUBTRACT)

    # Sketch14 → Cut-Extrude9 (cut, through all)
    with BuildSketch(Plane(origin=(24.8, 0, 0), x_dir=(0, 0, -1), z_dir=(1, 0, 0))):
        with Locations(Location((50, 201, 0), (0, 0, 25.856016698))):
            Circle(SKETCH14_R)
    extrude(amount=-CUT_EXTRUDE9_DEPTH, mode=Mode.SUBTRACT)


with BuildPart() as body_2:
    # Sketch13 → Boss-Extrude7 (new body)
    with BuildSketch(Plane(origin=(0, 0, -100), x_dir=(-1, 0, 0), z_dir=(0, 0, -1))):
        Polygon((-25, -100), (-25, -130), (25.018802851, -130), (25, -100), align=None)
    extrude(amount=BOSS_EXTRUDE7_DEPTH)

    # Fillet4
    # the kernel refuses this fillet: 10 mm, written as the material it takes off along each edge
    with BuildSketch(Plane(origin=(-25.021013242, -133.526683302, -100.1), x_dir=(0, 0, 1), z_dir=(0.0006267615930631998, 0.9999998035849335, 0))) as fillet4_piece_1:
        with BuildLine():
            CenterArc((10, 1.410673598), FILLET4_R, 180, 8.109614456)
            Line((0, 1.410673598), (0, 0))
            Line((0, 0), (0.1, 0))
        make_face()
    extrude(amount=37.053373882, mode=Mode.SUBTRACT)
    with BuildSketch(Plane(origin=(25, -96.473316005, -100.1), x_dir=(0, 0, 1), z_dir=(0, -1, 0))) as fillet4_piece_2:
        with BuildLine():
            CenterArc((10, 1.410673598), FILLET4_R, 180, 8.109614456)
            Line((0, 1.410673598), (0, 0))
            Line((0, 0), (0.1, 0))
        make_face()
    extrude(amount=37.05336799, mode=Mode.SUBTRACT)
    with BuildSketch(Plane(origin=(28.526683995, -130, -100.1), x_dir=(0, 0, 1), z_dir=(-1, 0, 0))) as fillet4_piece_3:
        with BuildLine():
            CenterArc((10, 1.410673598), FILLET4_R, 180, 8.109614456)
            Line((0, 1.410673598), (0, 0))
            Line((0, 0), (0.1, 0))
        make_face()
    extrude(amount=57.072170841, mode=Mode.SUBTRACT)


solid = Compound([part.part, body_2.part])
